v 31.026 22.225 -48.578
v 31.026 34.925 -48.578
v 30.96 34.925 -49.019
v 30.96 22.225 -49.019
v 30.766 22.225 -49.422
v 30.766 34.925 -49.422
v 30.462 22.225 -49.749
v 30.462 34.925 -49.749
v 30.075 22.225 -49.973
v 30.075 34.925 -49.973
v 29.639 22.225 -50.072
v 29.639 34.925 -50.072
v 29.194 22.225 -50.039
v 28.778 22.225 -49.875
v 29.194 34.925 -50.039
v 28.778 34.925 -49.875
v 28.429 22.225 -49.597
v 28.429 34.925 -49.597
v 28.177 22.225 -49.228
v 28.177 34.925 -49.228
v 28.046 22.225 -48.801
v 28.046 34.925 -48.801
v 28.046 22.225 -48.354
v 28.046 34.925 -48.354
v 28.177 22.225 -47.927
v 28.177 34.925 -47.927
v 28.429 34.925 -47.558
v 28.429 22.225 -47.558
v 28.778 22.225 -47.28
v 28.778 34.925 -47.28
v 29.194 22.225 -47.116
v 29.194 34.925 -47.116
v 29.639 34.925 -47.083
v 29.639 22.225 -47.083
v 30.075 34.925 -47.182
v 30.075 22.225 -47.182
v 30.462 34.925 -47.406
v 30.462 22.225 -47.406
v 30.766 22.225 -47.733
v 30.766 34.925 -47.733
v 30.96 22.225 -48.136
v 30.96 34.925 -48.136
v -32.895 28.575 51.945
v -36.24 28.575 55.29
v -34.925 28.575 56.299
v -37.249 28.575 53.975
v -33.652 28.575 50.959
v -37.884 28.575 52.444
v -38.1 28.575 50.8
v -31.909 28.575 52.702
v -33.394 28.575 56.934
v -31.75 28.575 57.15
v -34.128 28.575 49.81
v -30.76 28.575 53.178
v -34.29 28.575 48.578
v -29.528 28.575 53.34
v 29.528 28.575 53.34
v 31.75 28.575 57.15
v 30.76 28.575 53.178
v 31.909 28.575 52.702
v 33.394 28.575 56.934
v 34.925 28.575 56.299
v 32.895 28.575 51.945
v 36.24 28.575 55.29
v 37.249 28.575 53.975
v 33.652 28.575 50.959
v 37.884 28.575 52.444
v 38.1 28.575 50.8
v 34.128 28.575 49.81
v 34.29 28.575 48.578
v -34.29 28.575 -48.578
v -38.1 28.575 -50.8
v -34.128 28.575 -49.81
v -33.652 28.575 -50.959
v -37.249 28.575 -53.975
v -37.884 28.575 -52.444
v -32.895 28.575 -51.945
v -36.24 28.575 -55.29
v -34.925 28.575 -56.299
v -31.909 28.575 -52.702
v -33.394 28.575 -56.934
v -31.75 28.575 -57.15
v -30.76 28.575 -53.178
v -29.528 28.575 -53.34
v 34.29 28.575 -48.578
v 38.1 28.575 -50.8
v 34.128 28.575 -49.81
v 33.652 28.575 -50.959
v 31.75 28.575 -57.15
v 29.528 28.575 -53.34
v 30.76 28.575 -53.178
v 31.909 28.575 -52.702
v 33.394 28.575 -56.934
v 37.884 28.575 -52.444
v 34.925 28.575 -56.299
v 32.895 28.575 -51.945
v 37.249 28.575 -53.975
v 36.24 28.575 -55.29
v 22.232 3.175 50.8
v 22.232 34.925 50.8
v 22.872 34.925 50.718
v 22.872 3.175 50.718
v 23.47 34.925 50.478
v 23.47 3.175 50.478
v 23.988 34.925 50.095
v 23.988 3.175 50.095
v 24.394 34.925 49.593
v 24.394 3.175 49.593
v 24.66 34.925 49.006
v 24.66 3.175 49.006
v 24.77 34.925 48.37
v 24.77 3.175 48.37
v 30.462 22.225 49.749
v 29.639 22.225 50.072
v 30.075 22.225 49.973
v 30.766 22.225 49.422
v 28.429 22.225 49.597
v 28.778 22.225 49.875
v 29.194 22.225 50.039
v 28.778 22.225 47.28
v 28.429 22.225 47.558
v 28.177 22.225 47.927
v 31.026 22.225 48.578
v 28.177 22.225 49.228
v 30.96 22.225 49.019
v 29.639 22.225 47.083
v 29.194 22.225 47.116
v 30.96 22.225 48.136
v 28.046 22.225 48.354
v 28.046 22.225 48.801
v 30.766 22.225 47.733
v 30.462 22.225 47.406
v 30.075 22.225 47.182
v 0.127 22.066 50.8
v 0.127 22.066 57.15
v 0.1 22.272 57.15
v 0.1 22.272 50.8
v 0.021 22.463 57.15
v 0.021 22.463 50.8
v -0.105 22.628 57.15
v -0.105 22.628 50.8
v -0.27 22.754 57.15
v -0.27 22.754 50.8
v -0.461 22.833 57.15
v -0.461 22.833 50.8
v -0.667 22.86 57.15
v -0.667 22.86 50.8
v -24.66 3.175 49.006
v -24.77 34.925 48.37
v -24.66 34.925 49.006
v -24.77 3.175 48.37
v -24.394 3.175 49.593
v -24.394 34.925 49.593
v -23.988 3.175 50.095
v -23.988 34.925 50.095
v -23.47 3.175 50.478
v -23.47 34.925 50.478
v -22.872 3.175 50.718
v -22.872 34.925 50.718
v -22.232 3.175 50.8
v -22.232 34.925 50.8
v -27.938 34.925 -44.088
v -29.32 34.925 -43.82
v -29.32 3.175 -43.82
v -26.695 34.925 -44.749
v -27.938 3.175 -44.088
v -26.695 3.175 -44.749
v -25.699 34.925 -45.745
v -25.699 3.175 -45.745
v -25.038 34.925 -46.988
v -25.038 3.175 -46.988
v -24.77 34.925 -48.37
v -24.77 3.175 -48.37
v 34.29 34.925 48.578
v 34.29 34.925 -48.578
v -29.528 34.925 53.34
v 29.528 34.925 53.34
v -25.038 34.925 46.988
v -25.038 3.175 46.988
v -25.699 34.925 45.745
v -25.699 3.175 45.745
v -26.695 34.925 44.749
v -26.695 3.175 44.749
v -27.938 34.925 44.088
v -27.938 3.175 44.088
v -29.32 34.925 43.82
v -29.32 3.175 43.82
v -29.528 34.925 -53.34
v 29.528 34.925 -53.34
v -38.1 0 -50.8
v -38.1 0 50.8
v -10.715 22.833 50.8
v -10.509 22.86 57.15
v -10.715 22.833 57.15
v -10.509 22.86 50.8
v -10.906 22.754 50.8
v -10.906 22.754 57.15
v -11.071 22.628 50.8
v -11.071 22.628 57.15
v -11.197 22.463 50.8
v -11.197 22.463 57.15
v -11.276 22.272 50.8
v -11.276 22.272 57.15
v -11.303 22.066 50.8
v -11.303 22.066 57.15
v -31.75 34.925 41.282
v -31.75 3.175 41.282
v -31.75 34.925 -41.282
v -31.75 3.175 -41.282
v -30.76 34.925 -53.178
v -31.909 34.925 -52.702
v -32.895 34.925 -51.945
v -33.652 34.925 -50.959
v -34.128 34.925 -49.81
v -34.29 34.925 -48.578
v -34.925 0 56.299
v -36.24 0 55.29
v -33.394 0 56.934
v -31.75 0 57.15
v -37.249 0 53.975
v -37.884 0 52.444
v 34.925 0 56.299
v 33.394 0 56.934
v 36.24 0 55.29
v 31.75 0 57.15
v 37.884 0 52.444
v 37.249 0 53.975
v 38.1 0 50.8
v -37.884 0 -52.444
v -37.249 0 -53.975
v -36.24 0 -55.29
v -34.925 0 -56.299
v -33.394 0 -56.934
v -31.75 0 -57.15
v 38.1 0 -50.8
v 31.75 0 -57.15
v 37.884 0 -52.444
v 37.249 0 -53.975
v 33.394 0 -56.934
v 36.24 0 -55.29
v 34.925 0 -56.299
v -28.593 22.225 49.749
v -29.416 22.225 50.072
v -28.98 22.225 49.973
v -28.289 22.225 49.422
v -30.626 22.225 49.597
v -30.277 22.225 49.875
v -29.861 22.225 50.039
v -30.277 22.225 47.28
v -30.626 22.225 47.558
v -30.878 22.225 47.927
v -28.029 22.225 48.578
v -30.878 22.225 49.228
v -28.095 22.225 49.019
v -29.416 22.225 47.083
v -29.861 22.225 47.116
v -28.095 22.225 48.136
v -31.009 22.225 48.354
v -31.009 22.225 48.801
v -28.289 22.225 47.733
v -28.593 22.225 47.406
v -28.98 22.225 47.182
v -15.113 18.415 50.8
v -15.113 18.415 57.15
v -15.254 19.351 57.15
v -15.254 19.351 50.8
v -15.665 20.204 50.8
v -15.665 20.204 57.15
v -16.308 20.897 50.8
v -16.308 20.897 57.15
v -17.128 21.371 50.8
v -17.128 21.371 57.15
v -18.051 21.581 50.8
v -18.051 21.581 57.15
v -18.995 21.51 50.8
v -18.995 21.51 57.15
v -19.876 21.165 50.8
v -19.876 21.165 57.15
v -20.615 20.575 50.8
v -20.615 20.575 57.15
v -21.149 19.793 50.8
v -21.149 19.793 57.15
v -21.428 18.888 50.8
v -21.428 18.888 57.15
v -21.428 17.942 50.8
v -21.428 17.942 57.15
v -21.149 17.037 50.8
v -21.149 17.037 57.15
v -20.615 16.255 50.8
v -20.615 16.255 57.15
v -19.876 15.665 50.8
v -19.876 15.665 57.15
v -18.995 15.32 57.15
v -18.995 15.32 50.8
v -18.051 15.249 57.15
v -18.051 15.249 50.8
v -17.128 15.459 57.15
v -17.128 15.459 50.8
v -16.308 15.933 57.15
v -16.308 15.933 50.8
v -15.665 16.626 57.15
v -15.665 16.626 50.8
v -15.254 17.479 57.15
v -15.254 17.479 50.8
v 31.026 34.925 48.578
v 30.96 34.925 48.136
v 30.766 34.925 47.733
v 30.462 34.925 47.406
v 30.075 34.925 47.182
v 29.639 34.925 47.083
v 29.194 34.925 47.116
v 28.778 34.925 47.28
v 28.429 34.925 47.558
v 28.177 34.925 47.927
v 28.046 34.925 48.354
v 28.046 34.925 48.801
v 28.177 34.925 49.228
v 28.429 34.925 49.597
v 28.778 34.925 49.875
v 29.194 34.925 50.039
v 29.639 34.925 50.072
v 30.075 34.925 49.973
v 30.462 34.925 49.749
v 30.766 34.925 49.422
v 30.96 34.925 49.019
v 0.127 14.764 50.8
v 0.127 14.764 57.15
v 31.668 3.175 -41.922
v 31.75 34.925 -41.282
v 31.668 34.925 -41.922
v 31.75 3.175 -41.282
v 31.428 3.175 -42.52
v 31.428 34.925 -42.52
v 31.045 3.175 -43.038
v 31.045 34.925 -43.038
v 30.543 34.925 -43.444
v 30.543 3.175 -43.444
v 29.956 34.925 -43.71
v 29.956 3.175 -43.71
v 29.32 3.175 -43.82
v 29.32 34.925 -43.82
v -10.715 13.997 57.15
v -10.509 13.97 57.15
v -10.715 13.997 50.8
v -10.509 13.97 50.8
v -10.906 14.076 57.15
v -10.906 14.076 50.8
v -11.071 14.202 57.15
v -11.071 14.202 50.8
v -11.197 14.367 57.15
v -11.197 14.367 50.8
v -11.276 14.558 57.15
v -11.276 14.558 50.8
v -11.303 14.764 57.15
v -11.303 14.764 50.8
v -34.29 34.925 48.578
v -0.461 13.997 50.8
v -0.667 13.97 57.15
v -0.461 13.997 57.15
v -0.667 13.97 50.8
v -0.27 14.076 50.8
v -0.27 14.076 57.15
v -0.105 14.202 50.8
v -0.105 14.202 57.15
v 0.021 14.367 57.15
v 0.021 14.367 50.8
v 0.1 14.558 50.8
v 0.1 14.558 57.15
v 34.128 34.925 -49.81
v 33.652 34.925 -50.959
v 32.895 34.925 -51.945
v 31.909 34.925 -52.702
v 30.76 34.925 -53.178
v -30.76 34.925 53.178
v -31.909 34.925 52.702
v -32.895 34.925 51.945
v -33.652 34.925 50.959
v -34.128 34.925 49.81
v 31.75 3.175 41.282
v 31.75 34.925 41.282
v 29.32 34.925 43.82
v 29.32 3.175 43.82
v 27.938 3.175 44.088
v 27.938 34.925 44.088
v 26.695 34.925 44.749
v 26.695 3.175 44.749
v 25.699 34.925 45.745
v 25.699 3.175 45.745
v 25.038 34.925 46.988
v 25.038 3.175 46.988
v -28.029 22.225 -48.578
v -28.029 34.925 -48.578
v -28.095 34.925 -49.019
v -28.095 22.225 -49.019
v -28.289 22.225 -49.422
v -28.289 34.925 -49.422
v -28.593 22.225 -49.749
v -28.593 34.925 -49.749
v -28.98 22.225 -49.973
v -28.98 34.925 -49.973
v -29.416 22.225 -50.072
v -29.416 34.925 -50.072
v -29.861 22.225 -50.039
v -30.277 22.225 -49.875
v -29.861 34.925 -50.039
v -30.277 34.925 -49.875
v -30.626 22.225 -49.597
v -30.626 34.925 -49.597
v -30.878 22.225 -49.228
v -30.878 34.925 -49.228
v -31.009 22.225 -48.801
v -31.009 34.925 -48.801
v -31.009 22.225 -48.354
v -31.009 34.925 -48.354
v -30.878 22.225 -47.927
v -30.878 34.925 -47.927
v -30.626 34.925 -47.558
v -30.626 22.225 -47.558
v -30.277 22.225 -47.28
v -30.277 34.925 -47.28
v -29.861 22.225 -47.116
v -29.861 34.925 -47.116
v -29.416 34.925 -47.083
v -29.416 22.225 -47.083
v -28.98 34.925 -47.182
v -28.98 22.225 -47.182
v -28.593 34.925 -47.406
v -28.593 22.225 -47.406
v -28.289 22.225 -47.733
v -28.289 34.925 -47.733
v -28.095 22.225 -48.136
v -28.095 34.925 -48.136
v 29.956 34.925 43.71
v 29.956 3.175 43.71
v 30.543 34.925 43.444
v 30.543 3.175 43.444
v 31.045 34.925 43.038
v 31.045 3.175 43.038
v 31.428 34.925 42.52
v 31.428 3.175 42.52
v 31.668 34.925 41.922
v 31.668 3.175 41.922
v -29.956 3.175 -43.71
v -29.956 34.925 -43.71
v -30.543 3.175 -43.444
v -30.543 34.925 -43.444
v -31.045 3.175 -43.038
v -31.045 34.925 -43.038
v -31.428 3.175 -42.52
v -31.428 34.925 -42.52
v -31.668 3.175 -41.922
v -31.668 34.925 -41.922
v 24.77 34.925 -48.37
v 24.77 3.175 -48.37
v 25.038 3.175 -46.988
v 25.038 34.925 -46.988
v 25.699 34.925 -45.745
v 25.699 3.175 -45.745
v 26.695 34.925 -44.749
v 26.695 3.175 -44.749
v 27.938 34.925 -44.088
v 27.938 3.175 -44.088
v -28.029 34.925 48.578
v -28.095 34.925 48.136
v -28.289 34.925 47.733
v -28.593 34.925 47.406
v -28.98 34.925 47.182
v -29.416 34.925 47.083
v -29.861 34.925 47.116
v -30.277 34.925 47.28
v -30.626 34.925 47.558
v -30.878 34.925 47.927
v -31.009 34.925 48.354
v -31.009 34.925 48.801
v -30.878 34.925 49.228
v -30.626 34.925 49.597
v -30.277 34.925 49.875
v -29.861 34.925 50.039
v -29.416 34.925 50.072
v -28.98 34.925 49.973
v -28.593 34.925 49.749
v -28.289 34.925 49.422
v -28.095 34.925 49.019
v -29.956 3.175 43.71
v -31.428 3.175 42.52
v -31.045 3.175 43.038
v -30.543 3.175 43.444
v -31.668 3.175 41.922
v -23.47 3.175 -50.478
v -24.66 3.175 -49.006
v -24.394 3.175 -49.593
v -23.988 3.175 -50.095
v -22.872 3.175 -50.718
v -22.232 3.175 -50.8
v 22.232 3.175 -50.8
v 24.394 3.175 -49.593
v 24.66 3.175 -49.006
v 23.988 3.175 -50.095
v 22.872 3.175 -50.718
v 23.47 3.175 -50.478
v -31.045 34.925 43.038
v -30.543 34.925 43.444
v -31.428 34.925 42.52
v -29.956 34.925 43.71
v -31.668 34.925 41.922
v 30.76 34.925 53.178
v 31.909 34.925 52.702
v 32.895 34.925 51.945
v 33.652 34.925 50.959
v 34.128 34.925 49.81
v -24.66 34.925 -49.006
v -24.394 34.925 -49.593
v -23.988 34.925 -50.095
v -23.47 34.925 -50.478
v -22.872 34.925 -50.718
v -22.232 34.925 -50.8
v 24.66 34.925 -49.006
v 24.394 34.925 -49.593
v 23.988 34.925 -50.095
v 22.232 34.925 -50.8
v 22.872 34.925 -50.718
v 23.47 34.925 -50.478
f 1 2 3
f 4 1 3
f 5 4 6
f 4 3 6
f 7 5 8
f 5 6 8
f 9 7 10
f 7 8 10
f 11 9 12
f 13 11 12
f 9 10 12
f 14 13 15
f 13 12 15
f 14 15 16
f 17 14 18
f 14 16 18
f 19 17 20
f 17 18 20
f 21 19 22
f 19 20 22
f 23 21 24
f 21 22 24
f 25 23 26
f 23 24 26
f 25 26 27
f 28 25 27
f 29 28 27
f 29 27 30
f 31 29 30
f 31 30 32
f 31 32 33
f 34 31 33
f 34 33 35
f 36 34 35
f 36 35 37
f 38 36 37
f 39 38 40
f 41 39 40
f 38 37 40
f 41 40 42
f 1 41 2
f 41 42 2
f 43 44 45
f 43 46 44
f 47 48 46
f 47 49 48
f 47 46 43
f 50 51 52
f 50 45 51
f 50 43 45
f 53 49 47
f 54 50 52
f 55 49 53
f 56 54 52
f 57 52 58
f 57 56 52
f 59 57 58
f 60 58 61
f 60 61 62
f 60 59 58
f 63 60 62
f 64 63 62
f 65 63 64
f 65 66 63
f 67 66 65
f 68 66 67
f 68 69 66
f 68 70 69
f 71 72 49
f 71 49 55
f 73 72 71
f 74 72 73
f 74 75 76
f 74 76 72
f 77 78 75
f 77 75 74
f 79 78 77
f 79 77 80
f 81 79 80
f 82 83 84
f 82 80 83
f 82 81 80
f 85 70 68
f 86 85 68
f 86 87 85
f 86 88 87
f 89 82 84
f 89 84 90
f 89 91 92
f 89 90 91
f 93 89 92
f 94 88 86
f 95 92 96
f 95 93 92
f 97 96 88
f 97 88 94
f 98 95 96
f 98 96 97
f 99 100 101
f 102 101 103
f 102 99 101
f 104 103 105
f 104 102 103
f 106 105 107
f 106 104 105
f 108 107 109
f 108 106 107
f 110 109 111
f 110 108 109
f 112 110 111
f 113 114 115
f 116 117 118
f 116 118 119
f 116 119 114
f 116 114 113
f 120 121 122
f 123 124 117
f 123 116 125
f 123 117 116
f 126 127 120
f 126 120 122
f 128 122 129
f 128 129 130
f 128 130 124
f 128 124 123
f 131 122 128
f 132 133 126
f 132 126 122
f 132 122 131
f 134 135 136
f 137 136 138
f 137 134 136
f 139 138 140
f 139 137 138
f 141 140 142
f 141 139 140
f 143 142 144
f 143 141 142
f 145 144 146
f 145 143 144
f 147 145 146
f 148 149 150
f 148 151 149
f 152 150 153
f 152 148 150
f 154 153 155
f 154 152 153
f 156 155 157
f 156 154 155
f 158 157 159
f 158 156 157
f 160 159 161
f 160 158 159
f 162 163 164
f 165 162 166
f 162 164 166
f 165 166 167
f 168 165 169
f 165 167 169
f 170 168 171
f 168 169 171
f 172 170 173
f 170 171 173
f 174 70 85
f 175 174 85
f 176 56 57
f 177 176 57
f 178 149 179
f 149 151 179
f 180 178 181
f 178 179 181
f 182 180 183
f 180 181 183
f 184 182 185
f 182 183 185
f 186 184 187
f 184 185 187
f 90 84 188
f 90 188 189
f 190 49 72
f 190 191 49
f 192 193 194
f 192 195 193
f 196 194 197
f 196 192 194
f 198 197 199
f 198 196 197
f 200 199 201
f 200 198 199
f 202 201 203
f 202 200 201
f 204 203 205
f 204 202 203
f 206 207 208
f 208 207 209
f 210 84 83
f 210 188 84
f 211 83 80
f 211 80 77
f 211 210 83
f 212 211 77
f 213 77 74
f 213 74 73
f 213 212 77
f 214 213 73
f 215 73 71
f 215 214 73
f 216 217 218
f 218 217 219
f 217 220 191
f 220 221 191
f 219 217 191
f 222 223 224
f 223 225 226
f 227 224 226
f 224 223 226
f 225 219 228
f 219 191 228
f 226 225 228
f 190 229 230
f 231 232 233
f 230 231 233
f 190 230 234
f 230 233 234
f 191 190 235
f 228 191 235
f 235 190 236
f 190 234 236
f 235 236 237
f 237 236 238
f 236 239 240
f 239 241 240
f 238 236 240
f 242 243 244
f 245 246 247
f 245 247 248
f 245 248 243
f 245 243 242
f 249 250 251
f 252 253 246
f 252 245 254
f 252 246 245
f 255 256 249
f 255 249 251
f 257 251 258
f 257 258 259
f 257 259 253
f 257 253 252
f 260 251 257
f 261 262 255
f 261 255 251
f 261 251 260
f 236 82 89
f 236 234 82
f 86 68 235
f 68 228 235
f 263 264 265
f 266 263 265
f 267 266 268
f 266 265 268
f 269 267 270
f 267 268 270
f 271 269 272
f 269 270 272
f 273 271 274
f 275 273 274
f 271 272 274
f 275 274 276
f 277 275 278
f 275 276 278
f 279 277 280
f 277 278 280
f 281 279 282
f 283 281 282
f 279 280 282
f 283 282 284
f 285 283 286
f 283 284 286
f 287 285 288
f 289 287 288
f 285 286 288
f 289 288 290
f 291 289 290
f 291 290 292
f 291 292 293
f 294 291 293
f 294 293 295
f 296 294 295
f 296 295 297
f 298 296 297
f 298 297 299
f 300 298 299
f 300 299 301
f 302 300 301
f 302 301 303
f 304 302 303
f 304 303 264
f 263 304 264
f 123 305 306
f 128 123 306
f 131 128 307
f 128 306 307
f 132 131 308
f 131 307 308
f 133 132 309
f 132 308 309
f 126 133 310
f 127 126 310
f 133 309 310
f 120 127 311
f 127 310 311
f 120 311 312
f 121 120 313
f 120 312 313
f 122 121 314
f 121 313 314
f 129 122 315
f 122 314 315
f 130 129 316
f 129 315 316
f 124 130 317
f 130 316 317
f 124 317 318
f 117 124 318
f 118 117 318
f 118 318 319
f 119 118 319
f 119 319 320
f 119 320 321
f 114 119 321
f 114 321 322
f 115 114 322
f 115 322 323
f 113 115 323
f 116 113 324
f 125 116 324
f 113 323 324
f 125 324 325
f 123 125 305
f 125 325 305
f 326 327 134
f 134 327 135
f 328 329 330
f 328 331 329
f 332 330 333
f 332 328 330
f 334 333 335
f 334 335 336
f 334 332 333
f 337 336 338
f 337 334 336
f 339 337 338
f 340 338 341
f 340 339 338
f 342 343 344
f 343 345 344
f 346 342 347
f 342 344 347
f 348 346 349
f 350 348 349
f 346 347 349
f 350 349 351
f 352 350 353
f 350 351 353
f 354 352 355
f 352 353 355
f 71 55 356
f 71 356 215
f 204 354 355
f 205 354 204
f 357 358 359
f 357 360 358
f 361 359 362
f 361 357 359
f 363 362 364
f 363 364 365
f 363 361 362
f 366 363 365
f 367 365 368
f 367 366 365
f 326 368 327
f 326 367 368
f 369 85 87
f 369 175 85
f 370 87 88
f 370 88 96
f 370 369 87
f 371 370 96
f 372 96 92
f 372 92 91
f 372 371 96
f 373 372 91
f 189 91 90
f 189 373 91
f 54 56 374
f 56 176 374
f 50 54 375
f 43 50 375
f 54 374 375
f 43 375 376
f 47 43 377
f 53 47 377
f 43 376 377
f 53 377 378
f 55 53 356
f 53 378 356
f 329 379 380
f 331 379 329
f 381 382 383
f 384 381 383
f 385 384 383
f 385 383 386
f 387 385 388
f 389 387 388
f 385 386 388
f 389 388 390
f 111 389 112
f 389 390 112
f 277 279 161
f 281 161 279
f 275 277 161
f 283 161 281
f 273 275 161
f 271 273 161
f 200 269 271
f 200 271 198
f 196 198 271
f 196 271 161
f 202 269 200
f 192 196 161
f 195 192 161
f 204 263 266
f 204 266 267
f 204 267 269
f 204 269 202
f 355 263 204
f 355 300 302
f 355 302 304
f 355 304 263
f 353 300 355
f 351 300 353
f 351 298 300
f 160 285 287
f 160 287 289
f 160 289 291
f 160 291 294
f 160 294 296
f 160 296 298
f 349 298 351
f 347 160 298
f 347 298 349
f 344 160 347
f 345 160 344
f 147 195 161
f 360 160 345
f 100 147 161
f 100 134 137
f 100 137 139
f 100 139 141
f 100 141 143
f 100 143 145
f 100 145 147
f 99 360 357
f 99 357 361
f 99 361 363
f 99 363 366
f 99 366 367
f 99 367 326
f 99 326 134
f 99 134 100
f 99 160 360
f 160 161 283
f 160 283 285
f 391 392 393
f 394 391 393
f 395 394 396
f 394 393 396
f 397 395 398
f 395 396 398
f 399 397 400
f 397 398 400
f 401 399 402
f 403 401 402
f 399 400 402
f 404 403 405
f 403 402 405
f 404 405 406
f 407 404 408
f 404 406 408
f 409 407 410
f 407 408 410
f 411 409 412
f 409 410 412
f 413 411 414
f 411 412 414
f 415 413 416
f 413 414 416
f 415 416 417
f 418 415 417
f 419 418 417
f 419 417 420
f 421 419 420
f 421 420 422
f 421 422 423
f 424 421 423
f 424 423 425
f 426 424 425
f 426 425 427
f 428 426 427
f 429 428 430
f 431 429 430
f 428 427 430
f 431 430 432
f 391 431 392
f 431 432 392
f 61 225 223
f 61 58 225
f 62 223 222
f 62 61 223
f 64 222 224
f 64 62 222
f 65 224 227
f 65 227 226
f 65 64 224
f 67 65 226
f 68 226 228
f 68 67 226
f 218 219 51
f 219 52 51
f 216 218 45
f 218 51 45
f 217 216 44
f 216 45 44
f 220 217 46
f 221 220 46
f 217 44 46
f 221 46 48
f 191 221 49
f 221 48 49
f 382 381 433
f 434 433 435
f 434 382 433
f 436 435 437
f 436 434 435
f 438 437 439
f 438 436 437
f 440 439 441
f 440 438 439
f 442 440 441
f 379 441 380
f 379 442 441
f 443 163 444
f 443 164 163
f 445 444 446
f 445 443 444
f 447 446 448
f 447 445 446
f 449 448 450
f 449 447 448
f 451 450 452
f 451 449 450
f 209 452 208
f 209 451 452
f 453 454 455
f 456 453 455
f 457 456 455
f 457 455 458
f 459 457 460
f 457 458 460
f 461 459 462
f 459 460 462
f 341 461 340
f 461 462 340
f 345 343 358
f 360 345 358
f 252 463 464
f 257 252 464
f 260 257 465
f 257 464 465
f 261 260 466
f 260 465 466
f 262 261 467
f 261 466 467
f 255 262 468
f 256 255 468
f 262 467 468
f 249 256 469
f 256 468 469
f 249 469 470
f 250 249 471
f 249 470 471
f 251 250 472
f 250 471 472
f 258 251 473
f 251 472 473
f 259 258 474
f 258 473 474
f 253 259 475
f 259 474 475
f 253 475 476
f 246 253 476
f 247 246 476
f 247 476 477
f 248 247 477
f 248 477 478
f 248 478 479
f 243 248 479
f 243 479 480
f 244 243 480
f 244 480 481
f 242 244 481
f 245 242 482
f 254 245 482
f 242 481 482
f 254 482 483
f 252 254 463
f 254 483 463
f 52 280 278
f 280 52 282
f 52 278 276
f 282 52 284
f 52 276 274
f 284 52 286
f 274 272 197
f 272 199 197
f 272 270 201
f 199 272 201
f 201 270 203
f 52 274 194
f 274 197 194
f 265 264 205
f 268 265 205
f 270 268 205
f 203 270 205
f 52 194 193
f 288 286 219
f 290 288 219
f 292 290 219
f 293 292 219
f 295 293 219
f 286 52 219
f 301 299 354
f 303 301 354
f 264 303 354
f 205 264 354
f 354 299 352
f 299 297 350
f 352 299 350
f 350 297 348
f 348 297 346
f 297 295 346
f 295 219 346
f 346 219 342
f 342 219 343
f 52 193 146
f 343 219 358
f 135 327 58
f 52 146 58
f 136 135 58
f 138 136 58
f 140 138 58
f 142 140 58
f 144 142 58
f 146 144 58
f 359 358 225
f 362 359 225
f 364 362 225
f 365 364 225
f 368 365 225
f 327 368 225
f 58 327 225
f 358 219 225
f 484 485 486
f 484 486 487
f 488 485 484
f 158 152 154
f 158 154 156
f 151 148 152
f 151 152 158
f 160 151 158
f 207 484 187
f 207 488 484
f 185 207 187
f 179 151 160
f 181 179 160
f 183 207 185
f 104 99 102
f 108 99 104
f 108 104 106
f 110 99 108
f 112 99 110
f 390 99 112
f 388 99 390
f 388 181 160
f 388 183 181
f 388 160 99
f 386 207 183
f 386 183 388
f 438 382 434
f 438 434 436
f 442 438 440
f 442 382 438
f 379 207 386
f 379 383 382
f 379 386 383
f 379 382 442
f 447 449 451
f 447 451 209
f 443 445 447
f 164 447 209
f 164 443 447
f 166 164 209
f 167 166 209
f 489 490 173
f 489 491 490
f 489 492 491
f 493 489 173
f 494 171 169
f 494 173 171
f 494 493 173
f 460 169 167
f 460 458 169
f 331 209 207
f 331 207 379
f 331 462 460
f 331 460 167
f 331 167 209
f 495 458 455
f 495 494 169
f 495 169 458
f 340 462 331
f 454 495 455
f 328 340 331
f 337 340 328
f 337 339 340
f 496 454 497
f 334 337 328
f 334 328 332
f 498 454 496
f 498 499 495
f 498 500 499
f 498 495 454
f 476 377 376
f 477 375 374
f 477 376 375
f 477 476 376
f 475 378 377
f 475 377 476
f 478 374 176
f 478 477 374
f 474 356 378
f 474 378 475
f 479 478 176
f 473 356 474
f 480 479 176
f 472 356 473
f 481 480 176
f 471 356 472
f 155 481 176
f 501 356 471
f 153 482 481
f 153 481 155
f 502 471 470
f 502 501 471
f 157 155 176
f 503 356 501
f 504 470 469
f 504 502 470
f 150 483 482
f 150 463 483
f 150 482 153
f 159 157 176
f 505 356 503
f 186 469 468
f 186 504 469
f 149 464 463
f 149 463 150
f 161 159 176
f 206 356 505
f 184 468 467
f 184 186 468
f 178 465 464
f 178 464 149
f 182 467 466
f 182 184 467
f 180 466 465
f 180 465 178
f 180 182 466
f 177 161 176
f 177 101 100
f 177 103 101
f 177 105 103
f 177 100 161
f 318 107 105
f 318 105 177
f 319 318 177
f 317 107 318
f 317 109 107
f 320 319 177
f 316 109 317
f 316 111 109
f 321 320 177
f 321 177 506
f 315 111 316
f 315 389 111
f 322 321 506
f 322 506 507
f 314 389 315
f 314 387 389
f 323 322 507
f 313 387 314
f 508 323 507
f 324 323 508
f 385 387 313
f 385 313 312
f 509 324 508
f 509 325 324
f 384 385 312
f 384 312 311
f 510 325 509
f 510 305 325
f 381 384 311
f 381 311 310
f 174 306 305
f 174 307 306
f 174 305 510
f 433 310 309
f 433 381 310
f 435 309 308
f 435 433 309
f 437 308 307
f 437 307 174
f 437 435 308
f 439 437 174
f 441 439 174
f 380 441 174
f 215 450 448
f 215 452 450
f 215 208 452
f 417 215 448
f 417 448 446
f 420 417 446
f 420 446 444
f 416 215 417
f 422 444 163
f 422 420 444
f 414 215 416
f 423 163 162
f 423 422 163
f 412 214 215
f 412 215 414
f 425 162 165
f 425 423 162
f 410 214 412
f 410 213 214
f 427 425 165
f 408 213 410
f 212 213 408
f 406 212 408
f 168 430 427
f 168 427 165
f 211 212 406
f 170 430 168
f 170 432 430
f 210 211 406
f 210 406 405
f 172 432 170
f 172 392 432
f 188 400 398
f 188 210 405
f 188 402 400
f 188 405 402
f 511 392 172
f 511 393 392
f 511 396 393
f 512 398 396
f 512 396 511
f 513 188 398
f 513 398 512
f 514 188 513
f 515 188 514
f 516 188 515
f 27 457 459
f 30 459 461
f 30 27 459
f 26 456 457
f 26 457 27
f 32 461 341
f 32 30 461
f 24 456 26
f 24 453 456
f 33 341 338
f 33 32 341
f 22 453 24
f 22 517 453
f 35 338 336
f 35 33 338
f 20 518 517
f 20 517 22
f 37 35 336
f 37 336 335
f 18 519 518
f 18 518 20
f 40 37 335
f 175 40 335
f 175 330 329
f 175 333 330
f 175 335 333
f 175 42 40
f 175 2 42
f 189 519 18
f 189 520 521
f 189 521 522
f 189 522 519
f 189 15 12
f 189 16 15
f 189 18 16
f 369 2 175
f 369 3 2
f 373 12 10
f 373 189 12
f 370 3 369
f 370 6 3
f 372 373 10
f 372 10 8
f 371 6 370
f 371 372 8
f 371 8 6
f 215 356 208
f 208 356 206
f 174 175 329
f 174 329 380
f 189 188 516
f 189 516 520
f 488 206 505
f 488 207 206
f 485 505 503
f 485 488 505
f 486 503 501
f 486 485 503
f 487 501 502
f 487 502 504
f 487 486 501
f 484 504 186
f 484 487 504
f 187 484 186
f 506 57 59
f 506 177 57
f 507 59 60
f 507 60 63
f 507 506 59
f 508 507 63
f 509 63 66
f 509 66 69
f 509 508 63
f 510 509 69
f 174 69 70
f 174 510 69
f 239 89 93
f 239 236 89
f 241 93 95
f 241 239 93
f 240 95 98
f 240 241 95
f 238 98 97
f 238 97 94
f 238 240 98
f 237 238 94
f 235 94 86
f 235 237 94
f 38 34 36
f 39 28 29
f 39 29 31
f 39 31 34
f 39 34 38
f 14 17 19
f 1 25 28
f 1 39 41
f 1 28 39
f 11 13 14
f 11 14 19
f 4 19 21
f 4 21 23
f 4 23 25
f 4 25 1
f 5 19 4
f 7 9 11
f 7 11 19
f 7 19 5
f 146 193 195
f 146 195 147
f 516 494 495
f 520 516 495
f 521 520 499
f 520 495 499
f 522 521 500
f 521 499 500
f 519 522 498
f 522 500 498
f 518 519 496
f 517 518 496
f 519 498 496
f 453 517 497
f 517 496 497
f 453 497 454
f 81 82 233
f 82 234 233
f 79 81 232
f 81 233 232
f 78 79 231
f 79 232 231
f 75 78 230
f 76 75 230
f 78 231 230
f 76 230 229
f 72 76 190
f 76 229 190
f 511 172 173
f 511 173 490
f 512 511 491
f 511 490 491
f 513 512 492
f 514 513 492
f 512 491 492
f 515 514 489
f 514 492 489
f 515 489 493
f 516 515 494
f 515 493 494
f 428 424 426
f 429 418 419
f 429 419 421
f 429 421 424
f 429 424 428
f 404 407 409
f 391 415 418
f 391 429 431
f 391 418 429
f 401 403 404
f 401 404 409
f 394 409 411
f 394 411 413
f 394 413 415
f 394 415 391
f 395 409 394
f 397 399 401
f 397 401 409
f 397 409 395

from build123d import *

# Parameters (mm, degrees)
SKETCH1_W           = 76.2
SKETCH1_H           = 114.3
BOSS_EXTRUDE1_DEPTH = 3.175
SKETCH3_W           = 76.2
SKETCH3_H           = 114.3
SKETCH3_W_2         = 63.5
SKETCH3_H_2         = 101.6
BOSS_EXTRUDE2_DEPTH = 25.4
CUT_EXTRUDE1_REACH  = 116.3
SKETCH4_R           = 3.175
SKETCH4_W           = 11.43
SKETCH4_H           = 8.89
SKETCH5_W           = 68.58
SKETCH5_H           = 106.68
SKETCH5_W_2         = 63.5
SKETCH5_H_2         = 101.6
BOSS_EXTRUDE3_DEPTH = 6.35
FILLET3_R           = 6.35
FILLET4_R           = 4.7625
FILLET5_R           = 3.175
FILLET6_R           = 0.79375
SKETCH6_R           = 4.7625
BOSS_EXTRUDE4_DEPTH = 31.75
SKETCH8_R           = 1.4986
CUT_EXTRUDE2_DEPTH  = 12.7
FILLET8_R           = 2.54


with BuildPart() as part:
    # Sketch1 → Boss-Extrude1 (new body)
    with BuildSketch(Plane(origin=(0, 0, 0), x_dir=(1, 0, 0), z_dir=(0, 1, 0))):
        Rectangle(SKETCH1_W, SKETCH1_H)
    extrude(amount=BOSS_EXTRUDE1_DEPTH)

    # Sketch3 → Boss-Extrude2 (add)
    with BuildSketch(Plane(origin=(0, 3.175, 0), x_dir=(1, 0, 0), z_dir=(0, 1, 0))):
        Rectangle(SKETCH3_W, SKETCH3_H)
        Rectangle(SKETCH3_W_2, SKETCH3_H_2, mode=Mode.SUBTRACT)
    extrude(amount=BOSS_EXTRUDE2_DEPTH)

    # Sketch4 → Cut-Extrude1 (cut, up to next)
    with BuildSketch(Plane.XY.offset(57.15), mode=Mode.PRIVATE) as cut_extrude1_sk1:
        with Locations((-18.288, 18.415)):
            Circle(SKETCH4_R)
    cut_extrude1_tool1 = extrude(cut_extrude1_sk1.sketch, amount=-CUT_EXTRUDE1_REACH, mode=Mode.PRIVATE) & part.part
    add(cut_extrude1_tool1.solids().sort_by_distance((-18.288, 18.415, 57.15))[0], mode=Mode.SUBTRACT)
    # Sketch4 → Cut-Extrude1 (cut, up to next)
    with BuildSketch(Plane.XY.offset(57.15), mode=Mode.PRIVATE) as cut_extrude1_sk2:
        with Locations((-5.588, 18.415)):
            Rectangle(SKETCH4_W, SKETCH4_H)
    cut_extrude1_tool2 = extrude(cut_extrude1_sk2.sketch, amount=-CUT_EXTRUDE1_REACH, mode=Mode.PRIVATE) & part.part
    add(cut_extrude1_tool2.solids().sort_by_distance((-5.588, 18.415, 57.15))[0], mode=Mode.SUBTRACT)

    # Sketch5 → Boss-Extrude3 (add)
    with BuildSketch(Plane(origin=(0, 28.575, 0), x_dir=(1, 0, 0), z_dir=(0, 1, 0))):
        Rectangle(SKETCH5_W, SKETCH5_H)
        Rectangle(SKETCH5_W_2, SKETCH5_H_2, mode=Mode.SUBTRACT)
    extrude(amount=BOSS_EXTRUDE3_DEPTH)

    # Fillet3
    fillet3_edges = [part.edges().sort_by_distance(p)[0] for p in [
        (38.1, 14.2875, 57.15),
        (-38.1, 14.2875, 57.15),
        (-38.1, 14.2875, -57.15),
        (38.1, 14.2875, -57.15),
    ]]
    fillet(fillet3_edges, radius=FILLET3_R)

    # Fillet4
    fillet4_edges = [part.edges().sort_by_distance(p)[0] for p in [
        (-34.29, 31.75, -53.34),
        (-34.29, 31.75, 53.34),
        (34.29, 31.75, 53.34),
        (34.29, 31.75, -53.34),
    ]]
    fillet(fillet4_edges, radius=FILLET4_R)

    # Fillet5
    fillet5_edges = [part.edges().sort_by_distance(p)[0] for p in [
        (-31.75, 19.05, 50.8),
        (31.75, 19.05, 50.8),
        (31.75, 19.05, -50.8),
        (-31.75, 19.05, -50.8),
    ]]
    fillet(fillet5_edges, radius=FILLET5_R)

    # Fillet6
    fillet6_edges = [part.edges().sort_by_distance(p)[0] for p in [
        (0.127, 22.86, 53.975),
        (0.127, 13.97, 53.975),
        (-11.303, 13.97, 53.975),
        (-11.303, 22.86, 53.975),
    ]]
    fillet(fillet6_edges, radius=FILLET6_R)

    # Sketch6 → Boss-Extrude4 (add)
    with BuildSketch(Plane(origin=(0, 3.175, 0), x_dir=(1, 0, 0), z_dir=(0, 1, 0))):
        with Locations((-29.5275, 48.5775)):
            Circle(SKETCH6_R)
        with Locations((29.5275, 48.5775)):
            Circle(SKETCH6_R)
        with Locations((29.5275, -48.5775)):
            Circle(SKETCH6_R)
        with Locations((-29.5275, -48.5775)):
            Circle(SKETCH6_R)
    extrude(amount=BOSS_EXTRUDE4_DEPTH)

    # Sketch8 → Cut-Extrude2 (cut)
    with BuildSketch(Plane(origin=(0, 34.925, 0), x_dir=(1, 0, 0), z_dir=(0, 1, 0))):
        with Locations((-29.5275, 48.5775)):
            Circle(SKETCH8_R)
        with Locations((29.5275, 48.5775)):
            Circle(SKETCH8_R)
        with Locations((29.5275, -48.5775)):
            Circle(SKETCH8_R)
        with Locations((-29.5275, -48.5775)):
            Circle(SKETCH8_R)
    extrude(amount=-CUT_EXTRUDE2_DEPTH, mode=Mode.SUBTRACT)

    # Fillet8
    fillet8_edges = [part.edges().sort_by_distance(p)[0] for p in [
        (-31.75, 19.05, -44.365386516),
        (-25.315386516, 19.05, -50.8),
        (25.315386516, 19.05, -50.8),
        (31.75, 19.05, -44.365386516),
        (31.75, 19.05, 44.365386516),
        (25.315386516, 19.05, 50.8),
        (-25.315386516, 19.05, 50.8),
        (-31.75, 19.05, 44.365386516),
    ]]
    fillet(fillet8_edges, radius=FILLET8_R)


solid = part.part
